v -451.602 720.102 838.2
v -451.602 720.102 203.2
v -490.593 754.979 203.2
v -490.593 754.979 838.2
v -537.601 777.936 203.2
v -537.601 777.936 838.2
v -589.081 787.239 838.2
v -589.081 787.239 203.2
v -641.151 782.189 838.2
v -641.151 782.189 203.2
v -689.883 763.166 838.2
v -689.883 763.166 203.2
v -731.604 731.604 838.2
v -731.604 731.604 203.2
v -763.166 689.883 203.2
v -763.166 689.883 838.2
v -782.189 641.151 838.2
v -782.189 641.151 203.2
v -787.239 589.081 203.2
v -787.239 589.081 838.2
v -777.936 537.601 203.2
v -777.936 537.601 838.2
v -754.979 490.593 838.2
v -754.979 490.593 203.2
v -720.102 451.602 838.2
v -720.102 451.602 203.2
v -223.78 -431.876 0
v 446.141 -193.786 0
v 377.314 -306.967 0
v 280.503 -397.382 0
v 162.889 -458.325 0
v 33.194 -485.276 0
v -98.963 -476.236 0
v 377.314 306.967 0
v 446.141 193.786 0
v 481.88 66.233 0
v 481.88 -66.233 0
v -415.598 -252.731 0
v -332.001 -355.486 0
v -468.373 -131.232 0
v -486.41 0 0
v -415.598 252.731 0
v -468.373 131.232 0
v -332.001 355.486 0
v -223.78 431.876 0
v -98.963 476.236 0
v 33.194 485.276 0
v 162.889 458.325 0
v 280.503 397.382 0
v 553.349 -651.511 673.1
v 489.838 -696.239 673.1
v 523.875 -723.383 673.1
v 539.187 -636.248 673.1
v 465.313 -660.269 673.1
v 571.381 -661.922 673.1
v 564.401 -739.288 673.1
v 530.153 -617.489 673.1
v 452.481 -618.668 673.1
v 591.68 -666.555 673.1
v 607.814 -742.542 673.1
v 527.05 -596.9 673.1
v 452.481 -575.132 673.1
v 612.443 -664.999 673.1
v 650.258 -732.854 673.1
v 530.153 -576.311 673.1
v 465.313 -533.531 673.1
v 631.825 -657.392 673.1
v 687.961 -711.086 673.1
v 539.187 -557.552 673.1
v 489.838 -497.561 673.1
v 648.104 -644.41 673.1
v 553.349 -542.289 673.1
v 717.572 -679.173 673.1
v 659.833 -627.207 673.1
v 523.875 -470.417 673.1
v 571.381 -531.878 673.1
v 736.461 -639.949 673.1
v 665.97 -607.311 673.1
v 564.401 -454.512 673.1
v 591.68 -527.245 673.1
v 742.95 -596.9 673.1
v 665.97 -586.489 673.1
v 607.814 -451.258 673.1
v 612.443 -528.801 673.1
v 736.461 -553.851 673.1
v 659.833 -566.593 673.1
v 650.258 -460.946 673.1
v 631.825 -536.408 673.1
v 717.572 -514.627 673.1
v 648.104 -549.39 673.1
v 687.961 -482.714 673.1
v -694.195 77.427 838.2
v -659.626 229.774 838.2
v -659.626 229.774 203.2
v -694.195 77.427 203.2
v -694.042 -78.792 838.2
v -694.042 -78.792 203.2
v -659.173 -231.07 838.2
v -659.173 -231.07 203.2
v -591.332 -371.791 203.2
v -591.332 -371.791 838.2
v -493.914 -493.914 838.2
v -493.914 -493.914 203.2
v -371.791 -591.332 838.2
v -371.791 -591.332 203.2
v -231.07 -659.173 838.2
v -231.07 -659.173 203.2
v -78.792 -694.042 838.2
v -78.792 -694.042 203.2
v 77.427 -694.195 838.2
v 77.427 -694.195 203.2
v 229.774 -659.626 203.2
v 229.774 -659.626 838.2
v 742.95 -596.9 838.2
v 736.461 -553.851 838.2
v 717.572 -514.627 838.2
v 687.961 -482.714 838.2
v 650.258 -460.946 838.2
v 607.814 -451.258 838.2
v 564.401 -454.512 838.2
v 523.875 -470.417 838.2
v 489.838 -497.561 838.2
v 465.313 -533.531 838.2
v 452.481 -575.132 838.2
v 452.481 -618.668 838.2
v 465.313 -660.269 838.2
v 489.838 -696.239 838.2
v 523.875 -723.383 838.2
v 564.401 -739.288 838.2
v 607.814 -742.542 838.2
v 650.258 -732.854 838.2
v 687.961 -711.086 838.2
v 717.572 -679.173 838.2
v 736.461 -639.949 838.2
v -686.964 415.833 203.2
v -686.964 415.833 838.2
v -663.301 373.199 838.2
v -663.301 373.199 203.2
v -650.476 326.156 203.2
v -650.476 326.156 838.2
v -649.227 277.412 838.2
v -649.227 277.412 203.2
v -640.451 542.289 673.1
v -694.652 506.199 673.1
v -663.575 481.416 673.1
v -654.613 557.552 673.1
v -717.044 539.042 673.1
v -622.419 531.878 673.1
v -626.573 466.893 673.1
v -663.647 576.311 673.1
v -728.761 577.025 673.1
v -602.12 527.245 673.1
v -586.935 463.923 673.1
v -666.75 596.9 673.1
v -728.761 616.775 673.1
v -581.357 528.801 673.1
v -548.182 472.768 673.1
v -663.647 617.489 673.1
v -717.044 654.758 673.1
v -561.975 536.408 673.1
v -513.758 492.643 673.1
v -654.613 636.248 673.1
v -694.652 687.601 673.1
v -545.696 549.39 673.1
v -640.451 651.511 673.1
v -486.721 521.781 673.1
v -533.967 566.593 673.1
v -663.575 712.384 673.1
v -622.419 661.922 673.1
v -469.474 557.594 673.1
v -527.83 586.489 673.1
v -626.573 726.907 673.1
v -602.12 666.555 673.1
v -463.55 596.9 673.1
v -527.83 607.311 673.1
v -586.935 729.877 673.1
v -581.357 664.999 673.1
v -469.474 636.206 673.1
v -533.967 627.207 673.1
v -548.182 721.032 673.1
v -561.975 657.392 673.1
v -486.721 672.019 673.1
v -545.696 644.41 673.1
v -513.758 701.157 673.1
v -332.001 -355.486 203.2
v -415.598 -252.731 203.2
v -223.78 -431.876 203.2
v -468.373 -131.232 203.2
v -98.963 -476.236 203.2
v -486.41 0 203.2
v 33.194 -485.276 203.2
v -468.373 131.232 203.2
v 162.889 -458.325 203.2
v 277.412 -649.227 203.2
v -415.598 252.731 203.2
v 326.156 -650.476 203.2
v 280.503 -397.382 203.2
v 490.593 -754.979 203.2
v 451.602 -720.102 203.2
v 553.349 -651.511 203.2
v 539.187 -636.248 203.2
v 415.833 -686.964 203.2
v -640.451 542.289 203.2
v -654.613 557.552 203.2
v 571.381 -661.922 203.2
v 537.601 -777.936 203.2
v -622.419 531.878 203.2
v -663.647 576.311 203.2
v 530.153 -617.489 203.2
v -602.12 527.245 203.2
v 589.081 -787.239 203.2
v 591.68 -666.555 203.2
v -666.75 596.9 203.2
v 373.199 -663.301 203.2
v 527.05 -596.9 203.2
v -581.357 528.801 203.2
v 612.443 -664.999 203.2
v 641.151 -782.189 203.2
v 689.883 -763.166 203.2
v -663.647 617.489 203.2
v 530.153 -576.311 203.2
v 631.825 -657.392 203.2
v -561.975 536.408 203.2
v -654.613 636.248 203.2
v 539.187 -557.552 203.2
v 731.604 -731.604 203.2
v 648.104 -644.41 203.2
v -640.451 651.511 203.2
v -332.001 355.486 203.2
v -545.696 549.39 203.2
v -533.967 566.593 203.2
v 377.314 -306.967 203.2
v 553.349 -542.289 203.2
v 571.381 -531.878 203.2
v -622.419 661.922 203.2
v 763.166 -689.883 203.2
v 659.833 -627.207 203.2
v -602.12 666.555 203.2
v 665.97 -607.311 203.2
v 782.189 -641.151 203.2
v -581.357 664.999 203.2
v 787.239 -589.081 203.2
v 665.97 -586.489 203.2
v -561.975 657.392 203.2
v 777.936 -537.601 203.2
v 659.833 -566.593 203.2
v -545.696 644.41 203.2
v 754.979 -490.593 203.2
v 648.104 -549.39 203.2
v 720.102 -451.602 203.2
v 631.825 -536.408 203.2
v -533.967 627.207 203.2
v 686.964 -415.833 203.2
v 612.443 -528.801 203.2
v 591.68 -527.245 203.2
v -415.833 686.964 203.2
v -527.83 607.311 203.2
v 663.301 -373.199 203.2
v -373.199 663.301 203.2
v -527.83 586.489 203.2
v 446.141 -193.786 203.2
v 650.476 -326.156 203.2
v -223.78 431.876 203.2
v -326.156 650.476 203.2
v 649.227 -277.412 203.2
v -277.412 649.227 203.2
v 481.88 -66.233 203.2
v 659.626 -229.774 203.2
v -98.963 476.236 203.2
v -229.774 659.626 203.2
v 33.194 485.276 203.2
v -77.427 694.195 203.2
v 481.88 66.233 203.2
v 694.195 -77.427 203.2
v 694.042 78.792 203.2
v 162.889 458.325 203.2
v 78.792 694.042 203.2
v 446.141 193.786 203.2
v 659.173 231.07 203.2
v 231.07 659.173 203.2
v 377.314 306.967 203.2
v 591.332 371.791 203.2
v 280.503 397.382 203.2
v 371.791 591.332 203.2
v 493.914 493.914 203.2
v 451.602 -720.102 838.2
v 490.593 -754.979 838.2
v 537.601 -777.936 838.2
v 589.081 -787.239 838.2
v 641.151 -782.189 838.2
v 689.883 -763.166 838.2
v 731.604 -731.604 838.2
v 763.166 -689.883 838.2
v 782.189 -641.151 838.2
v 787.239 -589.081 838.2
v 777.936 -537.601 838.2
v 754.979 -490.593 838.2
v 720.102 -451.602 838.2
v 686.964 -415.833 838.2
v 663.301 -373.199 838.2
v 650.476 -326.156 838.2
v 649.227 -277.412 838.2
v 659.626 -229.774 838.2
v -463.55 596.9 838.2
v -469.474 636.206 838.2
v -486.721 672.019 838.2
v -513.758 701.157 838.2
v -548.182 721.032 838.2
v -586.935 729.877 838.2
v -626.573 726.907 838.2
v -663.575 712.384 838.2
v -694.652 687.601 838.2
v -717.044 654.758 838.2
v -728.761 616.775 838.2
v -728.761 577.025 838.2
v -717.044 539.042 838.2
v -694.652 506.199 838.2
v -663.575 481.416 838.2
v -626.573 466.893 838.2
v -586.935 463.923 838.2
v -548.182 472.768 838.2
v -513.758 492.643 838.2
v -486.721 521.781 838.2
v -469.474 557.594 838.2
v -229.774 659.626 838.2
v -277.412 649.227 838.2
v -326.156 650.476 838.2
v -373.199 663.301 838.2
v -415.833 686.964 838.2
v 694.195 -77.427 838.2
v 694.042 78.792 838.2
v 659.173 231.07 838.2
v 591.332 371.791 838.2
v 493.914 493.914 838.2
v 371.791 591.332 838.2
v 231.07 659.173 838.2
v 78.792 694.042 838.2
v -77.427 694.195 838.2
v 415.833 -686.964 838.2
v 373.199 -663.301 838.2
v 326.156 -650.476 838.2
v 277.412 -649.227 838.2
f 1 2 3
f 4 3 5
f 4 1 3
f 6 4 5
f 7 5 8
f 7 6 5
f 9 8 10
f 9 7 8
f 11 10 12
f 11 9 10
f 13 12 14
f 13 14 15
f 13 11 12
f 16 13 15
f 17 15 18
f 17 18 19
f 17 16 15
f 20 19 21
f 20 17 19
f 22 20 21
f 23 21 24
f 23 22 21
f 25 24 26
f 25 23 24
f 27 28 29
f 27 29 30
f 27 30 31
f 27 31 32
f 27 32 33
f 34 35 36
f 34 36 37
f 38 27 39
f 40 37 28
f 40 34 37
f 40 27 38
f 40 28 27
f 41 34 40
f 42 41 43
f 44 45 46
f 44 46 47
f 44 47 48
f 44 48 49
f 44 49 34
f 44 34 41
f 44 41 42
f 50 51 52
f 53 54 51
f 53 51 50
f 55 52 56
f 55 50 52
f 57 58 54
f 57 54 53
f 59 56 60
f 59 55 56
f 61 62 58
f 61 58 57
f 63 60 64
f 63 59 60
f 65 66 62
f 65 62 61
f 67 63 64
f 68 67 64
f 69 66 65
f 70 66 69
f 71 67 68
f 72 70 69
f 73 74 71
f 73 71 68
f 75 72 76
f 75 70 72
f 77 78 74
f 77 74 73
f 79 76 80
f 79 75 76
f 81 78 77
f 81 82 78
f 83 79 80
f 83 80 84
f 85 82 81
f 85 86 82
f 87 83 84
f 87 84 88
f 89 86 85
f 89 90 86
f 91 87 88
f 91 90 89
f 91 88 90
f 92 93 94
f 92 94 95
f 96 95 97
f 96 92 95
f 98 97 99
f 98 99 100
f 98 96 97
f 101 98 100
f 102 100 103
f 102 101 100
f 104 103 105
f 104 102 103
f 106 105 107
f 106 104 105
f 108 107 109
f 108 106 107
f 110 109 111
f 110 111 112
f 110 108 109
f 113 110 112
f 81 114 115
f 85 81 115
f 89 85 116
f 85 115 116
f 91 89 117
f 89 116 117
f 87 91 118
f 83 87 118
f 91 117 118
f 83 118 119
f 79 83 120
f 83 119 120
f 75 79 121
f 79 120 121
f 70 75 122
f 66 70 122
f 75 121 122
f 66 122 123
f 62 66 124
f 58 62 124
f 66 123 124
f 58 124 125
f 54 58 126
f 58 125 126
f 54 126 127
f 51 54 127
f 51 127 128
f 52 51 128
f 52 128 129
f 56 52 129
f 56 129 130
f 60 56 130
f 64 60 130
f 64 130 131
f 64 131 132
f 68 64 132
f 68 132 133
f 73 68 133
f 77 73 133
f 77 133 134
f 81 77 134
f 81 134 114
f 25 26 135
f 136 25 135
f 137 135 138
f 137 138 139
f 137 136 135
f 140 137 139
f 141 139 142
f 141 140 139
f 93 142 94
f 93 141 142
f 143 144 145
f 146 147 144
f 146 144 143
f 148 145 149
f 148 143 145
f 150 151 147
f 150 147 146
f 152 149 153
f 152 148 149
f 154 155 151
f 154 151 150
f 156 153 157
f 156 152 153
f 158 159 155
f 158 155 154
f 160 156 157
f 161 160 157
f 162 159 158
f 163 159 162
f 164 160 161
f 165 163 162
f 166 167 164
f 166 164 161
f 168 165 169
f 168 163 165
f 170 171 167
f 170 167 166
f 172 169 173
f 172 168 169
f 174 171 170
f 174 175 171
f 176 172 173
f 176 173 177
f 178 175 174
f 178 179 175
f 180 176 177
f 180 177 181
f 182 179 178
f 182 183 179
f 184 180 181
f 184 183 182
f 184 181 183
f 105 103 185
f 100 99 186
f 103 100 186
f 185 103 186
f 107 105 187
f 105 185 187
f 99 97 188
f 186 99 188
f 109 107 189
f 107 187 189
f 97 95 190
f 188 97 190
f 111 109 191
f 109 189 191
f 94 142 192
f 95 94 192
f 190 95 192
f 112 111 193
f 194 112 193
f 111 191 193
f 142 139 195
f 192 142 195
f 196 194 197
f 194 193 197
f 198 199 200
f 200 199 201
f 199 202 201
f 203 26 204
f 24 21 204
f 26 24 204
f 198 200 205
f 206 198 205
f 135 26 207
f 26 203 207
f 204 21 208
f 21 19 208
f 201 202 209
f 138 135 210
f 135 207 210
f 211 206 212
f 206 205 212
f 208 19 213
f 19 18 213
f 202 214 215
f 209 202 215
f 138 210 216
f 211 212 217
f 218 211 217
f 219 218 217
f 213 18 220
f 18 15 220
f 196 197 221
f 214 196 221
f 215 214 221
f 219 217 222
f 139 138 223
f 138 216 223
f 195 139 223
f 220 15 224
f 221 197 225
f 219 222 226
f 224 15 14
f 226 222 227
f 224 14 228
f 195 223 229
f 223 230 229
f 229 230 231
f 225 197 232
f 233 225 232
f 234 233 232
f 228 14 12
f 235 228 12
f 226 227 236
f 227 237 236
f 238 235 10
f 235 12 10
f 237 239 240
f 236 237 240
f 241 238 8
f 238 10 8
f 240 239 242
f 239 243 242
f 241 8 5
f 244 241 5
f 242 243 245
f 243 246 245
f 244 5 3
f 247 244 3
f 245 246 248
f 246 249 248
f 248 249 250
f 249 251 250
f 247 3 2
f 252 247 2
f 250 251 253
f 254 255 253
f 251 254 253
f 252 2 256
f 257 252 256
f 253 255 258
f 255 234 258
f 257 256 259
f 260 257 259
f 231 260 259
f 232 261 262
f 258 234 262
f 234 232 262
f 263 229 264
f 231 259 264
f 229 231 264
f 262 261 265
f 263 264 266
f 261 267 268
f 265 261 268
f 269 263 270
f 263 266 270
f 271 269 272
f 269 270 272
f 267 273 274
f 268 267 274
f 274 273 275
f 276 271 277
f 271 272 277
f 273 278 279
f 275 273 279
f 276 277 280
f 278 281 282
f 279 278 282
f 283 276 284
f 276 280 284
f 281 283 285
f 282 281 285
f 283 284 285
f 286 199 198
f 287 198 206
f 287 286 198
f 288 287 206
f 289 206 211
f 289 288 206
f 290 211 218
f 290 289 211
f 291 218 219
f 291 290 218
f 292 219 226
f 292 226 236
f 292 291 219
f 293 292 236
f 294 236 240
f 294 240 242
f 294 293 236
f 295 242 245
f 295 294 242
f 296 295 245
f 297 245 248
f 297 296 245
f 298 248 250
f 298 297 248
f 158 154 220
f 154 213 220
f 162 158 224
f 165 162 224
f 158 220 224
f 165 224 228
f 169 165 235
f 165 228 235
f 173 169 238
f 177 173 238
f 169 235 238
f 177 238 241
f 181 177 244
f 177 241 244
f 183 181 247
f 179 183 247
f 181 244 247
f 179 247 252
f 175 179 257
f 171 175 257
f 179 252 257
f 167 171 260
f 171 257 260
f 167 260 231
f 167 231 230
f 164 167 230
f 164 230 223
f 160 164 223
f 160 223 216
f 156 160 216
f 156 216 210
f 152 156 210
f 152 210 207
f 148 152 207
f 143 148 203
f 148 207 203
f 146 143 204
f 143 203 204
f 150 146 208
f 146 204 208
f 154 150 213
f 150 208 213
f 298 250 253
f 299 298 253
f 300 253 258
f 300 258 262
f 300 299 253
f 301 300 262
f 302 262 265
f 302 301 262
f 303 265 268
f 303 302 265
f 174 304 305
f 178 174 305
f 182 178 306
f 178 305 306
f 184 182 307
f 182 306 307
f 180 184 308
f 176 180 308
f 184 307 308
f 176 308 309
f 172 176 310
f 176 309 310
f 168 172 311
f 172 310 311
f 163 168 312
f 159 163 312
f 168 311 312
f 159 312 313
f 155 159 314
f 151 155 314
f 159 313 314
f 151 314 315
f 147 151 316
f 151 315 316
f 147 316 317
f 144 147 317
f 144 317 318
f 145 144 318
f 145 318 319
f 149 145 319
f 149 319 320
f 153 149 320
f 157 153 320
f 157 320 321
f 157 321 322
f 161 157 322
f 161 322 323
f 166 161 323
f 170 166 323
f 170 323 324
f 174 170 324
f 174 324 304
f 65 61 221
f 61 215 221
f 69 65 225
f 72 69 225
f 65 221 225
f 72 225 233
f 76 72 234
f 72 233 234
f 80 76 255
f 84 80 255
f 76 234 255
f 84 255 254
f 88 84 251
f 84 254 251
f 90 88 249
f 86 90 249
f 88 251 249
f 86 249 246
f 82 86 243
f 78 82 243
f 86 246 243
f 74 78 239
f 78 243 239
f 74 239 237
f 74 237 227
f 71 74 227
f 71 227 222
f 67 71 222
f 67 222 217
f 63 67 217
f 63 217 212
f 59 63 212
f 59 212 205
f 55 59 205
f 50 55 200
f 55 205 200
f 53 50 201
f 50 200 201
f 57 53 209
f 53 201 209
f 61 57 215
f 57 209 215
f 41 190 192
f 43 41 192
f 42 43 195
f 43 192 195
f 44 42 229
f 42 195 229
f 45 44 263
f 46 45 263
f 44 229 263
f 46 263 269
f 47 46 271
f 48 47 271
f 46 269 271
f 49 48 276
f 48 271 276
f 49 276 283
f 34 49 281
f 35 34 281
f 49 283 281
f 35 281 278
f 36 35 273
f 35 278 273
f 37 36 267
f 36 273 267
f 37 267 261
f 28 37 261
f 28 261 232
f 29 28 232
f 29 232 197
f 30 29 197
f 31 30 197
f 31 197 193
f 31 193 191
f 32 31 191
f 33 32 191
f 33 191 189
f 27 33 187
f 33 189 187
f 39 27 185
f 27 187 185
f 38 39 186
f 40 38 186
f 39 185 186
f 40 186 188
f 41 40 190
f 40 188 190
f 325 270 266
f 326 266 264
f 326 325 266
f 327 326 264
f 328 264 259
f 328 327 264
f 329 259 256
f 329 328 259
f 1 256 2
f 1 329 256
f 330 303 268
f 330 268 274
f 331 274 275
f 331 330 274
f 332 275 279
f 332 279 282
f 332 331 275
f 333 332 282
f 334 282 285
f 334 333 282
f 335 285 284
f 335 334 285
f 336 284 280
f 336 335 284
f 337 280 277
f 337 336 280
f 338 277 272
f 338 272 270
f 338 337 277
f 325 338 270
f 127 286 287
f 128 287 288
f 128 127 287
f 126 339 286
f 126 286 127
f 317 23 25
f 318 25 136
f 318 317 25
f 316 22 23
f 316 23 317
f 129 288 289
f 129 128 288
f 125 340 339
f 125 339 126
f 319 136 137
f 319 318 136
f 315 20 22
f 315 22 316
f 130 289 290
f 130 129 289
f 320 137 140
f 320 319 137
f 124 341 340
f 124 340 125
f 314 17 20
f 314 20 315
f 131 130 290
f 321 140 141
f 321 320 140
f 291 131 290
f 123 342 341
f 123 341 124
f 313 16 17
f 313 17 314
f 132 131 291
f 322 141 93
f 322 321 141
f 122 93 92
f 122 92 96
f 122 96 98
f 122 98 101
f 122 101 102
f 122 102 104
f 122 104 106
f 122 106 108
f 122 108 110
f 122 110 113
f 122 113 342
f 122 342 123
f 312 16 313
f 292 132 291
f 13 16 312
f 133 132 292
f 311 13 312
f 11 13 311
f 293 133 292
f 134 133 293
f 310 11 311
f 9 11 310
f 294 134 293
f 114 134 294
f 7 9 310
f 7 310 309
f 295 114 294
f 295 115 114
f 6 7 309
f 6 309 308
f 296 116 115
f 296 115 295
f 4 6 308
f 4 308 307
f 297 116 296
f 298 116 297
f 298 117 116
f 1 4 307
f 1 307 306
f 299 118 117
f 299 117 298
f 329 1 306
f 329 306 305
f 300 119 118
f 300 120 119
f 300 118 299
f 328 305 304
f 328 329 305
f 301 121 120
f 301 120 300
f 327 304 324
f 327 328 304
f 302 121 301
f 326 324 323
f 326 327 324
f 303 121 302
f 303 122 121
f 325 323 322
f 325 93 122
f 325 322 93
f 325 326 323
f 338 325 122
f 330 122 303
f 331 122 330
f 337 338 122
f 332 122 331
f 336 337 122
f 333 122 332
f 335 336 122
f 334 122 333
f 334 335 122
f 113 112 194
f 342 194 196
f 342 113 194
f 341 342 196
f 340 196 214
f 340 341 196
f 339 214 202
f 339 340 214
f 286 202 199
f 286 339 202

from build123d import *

# Parameters (mm, degrees)
BOSS_EXTRU_1_DEPTH   = 635
ESQUISSE2_R          = 486.41
BOSS_EXTRU_2_DEPTH   = 203.2
PER_AGE1_D           = 139.7
PER_AGE1_DEPTH       = 838.2
PER_AGE1_CBORE_D     = 266.7
PER_AGE1_CBORE_DEPTH = 165.1
PER_AGE2_D           = 139.7
PER_AGE2_DEPTH       = 838.2
PER_AGE2_CBORE_D     = 292.1
PER_AGE2_CBORE_DEPTH = 165.1


with BuildPart() as part:
    # Esquisse1 → Boss.-Extru.1 (new body)
    with BuildSketch(Plane.XY.offset(838.2)):
        with BuildLine():
            ThreePointArc((-720.101782381, 451.601786597), (-655.471932336, 350.063866609), (-659.625858178, 229.773752251))
            ThreePointArc((-659.625858178, 229.773752251), (-493.914086659, -493.914086659), (229.773752251, -659.625858178))
            ThreePointArc((229.773752251, -659.625858178), (350.063866609, -655.471932336), (451.601786597, -720.101782381))
            ThreePointArc((451.601786597, -720.101782381), (731.603841816, -731.603841816), (720.101782381, -451.601786597))
            ThreePointArc((720.101782381, -451.601786597), (655.471932336, -350.063866609), (659.625858178, -229.773752251))
            ThreePointArc((659.625858178, -229.773752251), (493.914086659, 493.914086659), (-229.773752251, 659.625858178))
            ThreePointArc((-229.773752251, 659.625858178), (-350.063866609, 655.471932336), (-451.601786597, 720.101782381))
            ThreePointArc((-451.601786597, 720.101782381), (-731.603841816, 731.603841816), (-720.101782381, 451.601786597))
        make_face()
    extrude(amount=-BOSS_EXTRU_1_DEPTH)

    # Esquisse2 → Boss.-Extru.2 (add)
    with BuildSketch(Plane(origin=(0, 0, 203.2), x_dir=(-1, 0, 0), z_dir=(0, 0, -1))):
        Circle(ESQUISSE2_R)
    extrude(amount=BOSS_EXTRU_2_DEPTH)

    # Perçage1
    with Locations(Plane.XY.offset(838.2)):
        with Locations((-596.9, 596.9)):
            CounterBoreHole(PER_AGE1_D / 2, PER_AGE1_CBORE_D / 2, PER_AGE1_CBORE_DEPTH, depth=PER_AGE1_DEPTH)

    # Perçage2
    with Locations(Plane.XY.offset(838.2)):
        with Locations((596.9, -596.9)):
            CounterBoreHole(PER_AGE2_D / 2, PER_AGE2_CBORE_D / 2, PER_AGE2_CBORE_DEPTH, depth=PER_AGE2_DEPTH)


solid = part.part
